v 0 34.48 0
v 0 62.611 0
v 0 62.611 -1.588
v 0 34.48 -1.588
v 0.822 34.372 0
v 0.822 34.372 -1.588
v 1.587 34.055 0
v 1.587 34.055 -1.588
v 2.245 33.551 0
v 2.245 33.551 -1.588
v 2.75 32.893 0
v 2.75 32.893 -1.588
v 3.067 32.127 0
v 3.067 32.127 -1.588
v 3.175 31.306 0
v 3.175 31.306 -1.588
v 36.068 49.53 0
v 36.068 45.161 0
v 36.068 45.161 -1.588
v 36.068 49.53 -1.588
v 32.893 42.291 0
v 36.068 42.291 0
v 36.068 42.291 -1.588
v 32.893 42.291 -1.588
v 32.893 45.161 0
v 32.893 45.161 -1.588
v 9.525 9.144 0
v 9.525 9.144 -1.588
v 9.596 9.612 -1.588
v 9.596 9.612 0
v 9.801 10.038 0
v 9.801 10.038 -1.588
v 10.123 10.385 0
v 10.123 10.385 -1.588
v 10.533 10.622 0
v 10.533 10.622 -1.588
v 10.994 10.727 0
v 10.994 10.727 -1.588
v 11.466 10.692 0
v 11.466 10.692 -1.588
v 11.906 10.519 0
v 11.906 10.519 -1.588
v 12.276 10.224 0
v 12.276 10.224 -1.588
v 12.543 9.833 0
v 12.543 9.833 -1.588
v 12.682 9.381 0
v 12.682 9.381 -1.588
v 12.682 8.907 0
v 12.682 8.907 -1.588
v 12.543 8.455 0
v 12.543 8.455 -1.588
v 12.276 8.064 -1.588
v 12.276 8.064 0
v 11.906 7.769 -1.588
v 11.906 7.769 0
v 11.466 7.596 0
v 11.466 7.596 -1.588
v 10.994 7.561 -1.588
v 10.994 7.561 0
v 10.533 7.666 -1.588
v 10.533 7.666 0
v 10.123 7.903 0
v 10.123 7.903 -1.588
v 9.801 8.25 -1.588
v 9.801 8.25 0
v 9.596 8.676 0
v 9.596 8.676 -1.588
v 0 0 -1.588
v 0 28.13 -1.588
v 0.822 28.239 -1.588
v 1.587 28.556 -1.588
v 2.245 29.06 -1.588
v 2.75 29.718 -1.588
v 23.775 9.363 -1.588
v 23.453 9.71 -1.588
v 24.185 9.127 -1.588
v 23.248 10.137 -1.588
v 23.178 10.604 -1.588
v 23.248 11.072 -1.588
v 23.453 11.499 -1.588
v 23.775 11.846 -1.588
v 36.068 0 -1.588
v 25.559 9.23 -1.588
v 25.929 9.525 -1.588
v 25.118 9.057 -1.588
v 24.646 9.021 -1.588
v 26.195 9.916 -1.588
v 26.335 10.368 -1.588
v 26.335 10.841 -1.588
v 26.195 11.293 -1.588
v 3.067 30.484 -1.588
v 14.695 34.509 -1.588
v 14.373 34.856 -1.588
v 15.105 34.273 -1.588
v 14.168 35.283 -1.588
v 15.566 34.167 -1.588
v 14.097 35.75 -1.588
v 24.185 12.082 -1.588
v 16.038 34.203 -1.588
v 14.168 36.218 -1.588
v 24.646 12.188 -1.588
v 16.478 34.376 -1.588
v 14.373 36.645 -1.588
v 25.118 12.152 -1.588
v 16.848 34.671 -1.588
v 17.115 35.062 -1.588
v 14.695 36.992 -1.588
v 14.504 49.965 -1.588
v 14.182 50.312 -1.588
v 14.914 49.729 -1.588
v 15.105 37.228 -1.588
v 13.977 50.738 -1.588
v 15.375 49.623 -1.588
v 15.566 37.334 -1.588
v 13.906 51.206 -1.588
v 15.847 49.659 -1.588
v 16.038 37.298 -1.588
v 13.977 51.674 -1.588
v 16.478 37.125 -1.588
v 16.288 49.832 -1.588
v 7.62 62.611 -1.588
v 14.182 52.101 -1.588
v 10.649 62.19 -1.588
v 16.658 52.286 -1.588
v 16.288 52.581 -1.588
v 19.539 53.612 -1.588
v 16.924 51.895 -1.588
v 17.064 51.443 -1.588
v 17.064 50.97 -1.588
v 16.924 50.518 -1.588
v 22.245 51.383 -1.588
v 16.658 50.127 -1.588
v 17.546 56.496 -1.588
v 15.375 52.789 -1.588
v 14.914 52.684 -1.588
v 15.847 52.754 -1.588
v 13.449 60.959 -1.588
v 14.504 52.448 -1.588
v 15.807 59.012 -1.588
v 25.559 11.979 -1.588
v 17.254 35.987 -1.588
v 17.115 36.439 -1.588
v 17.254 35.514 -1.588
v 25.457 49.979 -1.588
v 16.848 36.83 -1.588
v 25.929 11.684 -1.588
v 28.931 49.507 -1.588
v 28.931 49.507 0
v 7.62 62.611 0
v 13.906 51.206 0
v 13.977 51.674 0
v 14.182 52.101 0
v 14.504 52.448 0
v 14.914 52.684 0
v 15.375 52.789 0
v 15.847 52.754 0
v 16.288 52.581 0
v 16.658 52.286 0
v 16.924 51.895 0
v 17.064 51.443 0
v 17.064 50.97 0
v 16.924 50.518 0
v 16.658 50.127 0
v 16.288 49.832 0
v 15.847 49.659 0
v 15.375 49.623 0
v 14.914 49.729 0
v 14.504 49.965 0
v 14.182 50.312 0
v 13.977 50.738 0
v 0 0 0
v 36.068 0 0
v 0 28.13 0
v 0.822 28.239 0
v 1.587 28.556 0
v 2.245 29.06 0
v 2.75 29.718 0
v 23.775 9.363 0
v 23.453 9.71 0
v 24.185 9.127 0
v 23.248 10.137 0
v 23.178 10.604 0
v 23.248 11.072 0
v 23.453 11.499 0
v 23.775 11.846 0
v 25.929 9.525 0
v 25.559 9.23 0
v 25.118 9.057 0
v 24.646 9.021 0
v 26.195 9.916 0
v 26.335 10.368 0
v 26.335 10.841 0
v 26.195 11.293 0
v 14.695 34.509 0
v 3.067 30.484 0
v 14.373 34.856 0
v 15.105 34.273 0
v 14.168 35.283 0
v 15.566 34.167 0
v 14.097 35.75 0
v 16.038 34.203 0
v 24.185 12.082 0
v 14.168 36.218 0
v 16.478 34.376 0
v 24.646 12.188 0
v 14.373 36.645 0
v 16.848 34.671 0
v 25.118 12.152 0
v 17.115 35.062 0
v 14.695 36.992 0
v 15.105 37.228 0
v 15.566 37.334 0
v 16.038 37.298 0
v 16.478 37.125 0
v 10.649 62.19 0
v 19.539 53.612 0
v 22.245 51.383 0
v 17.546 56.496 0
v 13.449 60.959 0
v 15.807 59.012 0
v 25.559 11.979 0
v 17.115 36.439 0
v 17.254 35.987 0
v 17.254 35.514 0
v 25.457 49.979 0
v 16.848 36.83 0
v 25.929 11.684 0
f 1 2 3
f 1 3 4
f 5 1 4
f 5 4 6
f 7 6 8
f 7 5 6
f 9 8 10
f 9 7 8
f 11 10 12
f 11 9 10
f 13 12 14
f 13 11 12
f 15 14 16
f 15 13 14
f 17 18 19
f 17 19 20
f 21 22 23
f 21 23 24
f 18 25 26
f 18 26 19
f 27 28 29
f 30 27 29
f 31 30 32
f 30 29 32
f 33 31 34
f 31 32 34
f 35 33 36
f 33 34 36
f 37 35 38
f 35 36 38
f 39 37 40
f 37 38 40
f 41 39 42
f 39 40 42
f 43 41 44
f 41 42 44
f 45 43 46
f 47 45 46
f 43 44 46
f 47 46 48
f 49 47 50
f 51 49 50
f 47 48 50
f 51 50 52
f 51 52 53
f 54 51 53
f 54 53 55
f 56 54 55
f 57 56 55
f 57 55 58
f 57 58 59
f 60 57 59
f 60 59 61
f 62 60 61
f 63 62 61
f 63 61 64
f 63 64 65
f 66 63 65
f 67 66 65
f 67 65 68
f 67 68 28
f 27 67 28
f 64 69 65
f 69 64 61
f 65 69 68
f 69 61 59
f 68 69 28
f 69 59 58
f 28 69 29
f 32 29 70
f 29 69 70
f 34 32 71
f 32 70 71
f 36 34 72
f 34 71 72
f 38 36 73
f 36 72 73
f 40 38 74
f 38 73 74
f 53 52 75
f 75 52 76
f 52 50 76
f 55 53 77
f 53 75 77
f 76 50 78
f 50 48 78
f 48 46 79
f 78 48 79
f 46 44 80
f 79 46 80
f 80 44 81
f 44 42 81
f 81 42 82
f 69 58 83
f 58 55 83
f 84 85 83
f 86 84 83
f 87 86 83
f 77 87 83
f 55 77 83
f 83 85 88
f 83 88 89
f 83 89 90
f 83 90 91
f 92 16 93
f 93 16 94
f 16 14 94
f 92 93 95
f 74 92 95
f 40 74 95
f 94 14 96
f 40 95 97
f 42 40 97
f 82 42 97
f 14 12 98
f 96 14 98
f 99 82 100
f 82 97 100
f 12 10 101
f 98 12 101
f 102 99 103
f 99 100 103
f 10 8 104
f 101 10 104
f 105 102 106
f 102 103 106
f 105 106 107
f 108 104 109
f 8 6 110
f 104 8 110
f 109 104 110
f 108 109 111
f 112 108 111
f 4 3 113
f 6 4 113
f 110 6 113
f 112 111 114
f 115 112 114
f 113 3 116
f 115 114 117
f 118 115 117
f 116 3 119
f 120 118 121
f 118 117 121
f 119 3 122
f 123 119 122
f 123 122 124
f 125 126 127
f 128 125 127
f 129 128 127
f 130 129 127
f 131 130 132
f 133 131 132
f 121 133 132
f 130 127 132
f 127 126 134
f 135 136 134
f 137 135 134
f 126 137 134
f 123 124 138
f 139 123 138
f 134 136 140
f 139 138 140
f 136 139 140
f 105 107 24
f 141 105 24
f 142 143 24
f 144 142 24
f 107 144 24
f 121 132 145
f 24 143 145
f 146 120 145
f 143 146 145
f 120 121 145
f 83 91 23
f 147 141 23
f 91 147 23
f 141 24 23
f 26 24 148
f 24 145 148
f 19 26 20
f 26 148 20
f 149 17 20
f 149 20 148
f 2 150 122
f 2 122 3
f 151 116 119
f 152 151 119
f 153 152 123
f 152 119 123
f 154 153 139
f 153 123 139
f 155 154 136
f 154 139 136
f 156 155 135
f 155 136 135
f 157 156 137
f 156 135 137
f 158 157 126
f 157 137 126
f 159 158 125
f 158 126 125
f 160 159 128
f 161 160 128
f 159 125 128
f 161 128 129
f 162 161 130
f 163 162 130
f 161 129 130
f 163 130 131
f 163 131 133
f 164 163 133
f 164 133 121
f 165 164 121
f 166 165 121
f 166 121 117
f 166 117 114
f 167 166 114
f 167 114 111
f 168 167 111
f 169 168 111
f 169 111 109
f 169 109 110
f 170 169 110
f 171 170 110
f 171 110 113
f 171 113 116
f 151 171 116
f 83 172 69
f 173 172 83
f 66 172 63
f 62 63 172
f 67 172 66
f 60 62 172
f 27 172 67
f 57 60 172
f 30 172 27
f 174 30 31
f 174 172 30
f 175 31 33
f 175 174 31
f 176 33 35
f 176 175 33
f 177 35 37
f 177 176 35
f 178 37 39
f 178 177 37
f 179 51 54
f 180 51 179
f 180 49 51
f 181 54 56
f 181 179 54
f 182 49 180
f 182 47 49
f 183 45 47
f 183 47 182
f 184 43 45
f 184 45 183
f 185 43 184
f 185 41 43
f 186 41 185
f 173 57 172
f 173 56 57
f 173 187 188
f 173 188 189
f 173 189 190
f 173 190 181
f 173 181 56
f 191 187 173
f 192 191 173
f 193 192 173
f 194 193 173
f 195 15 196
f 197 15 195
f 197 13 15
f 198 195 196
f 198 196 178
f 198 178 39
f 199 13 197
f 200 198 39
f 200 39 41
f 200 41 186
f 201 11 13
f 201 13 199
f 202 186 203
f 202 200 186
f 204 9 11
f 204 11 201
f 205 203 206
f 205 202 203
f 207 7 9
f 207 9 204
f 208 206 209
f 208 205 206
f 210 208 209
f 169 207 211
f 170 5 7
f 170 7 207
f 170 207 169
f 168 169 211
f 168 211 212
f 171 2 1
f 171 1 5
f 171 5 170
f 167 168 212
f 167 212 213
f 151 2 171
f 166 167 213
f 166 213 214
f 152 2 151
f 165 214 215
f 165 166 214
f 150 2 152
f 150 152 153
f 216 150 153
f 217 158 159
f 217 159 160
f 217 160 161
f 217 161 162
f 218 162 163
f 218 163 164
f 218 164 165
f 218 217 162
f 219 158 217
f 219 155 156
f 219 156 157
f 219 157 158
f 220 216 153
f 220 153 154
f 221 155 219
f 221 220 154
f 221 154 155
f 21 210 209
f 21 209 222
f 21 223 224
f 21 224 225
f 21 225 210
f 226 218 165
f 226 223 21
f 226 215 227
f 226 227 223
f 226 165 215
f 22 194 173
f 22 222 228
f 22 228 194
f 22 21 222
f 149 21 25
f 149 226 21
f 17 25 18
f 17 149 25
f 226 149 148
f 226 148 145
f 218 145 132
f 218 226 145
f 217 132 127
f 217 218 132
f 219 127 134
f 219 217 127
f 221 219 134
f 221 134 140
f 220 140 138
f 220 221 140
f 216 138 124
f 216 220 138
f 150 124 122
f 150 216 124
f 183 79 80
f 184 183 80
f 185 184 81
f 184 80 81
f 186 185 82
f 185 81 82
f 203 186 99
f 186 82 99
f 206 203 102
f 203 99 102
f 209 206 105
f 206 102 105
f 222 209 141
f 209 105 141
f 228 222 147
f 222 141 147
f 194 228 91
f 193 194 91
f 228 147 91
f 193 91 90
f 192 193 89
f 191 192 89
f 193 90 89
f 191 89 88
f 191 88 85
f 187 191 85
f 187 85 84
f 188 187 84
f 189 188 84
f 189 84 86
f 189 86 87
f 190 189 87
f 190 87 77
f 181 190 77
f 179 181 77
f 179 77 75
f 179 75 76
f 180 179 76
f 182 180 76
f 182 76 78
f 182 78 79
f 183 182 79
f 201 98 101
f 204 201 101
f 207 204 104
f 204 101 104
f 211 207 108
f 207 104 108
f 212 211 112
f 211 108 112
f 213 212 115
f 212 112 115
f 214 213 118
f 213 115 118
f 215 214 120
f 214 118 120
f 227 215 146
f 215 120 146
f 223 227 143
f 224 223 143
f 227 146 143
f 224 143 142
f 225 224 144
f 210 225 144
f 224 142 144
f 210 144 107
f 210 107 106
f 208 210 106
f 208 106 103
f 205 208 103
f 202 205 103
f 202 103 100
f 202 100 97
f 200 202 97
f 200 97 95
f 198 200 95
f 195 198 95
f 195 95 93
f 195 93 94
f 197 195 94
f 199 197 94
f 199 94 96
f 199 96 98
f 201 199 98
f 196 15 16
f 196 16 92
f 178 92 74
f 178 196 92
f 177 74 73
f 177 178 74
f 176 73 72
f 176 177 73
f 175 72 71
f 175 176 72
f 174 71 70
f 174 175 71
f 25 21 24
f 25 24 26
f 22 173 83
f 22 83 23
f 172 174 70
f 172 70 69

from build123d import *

# Parameters (mm, degrees)
F1_DEPTH = 1.5875
F2_D     = 3.175


with BuildPart() as f1:
    # F0 (on Top) → F1 (new body)
    with BuildSketch(Plane.XY):
        with BuildLine():
            Line((0, 28.1305), (0, 0))
            Line((0, 0), (36.068, 0))
            Line((36.068, 0), (36.068, 42.291))
            Line((36.068, 42.291), (32.893, 42.291))
            Line((32.893, 42.291), (32.893, 45.1612))
            Line((32.893, 45.1612), (36.068, 45.1612))
            Line((36.068, 45.1612), (36.068, 49.53))
            Line((36.068, 49.53), (28.9306, 49.506645))
            ThreePointArc((28.9306, 49.506645), (22.244888, 51.383214), (17.545554, 56.495603))
            ThreePointArc((17.545554, 56.495603), (13.449123, 60.959419), (7.62, 62.611))
            Line((7.62, 62.611), (0, 62.611))
            Line((0, 62.611), (0, 34.4805))
            ThreePointArc((0, 34.4805), (2.245064, 33.550564), (3.175, 31.3055))
            ThreePointArc((3.175, 31.3055), (2.245064, 29.060436), (0, 28.1305))
        make_face()
    extrude(amount=-F1_DEPTH)

    # F2 (through all)
    with Locations(Plane.XY):
        with Locations((15.494, 51.2064), (15.6845, 35.7505), (11.1125, 9.144), (24.765, 10.6045)):
            Hole(F2_D / 2)


solid = f1.part
